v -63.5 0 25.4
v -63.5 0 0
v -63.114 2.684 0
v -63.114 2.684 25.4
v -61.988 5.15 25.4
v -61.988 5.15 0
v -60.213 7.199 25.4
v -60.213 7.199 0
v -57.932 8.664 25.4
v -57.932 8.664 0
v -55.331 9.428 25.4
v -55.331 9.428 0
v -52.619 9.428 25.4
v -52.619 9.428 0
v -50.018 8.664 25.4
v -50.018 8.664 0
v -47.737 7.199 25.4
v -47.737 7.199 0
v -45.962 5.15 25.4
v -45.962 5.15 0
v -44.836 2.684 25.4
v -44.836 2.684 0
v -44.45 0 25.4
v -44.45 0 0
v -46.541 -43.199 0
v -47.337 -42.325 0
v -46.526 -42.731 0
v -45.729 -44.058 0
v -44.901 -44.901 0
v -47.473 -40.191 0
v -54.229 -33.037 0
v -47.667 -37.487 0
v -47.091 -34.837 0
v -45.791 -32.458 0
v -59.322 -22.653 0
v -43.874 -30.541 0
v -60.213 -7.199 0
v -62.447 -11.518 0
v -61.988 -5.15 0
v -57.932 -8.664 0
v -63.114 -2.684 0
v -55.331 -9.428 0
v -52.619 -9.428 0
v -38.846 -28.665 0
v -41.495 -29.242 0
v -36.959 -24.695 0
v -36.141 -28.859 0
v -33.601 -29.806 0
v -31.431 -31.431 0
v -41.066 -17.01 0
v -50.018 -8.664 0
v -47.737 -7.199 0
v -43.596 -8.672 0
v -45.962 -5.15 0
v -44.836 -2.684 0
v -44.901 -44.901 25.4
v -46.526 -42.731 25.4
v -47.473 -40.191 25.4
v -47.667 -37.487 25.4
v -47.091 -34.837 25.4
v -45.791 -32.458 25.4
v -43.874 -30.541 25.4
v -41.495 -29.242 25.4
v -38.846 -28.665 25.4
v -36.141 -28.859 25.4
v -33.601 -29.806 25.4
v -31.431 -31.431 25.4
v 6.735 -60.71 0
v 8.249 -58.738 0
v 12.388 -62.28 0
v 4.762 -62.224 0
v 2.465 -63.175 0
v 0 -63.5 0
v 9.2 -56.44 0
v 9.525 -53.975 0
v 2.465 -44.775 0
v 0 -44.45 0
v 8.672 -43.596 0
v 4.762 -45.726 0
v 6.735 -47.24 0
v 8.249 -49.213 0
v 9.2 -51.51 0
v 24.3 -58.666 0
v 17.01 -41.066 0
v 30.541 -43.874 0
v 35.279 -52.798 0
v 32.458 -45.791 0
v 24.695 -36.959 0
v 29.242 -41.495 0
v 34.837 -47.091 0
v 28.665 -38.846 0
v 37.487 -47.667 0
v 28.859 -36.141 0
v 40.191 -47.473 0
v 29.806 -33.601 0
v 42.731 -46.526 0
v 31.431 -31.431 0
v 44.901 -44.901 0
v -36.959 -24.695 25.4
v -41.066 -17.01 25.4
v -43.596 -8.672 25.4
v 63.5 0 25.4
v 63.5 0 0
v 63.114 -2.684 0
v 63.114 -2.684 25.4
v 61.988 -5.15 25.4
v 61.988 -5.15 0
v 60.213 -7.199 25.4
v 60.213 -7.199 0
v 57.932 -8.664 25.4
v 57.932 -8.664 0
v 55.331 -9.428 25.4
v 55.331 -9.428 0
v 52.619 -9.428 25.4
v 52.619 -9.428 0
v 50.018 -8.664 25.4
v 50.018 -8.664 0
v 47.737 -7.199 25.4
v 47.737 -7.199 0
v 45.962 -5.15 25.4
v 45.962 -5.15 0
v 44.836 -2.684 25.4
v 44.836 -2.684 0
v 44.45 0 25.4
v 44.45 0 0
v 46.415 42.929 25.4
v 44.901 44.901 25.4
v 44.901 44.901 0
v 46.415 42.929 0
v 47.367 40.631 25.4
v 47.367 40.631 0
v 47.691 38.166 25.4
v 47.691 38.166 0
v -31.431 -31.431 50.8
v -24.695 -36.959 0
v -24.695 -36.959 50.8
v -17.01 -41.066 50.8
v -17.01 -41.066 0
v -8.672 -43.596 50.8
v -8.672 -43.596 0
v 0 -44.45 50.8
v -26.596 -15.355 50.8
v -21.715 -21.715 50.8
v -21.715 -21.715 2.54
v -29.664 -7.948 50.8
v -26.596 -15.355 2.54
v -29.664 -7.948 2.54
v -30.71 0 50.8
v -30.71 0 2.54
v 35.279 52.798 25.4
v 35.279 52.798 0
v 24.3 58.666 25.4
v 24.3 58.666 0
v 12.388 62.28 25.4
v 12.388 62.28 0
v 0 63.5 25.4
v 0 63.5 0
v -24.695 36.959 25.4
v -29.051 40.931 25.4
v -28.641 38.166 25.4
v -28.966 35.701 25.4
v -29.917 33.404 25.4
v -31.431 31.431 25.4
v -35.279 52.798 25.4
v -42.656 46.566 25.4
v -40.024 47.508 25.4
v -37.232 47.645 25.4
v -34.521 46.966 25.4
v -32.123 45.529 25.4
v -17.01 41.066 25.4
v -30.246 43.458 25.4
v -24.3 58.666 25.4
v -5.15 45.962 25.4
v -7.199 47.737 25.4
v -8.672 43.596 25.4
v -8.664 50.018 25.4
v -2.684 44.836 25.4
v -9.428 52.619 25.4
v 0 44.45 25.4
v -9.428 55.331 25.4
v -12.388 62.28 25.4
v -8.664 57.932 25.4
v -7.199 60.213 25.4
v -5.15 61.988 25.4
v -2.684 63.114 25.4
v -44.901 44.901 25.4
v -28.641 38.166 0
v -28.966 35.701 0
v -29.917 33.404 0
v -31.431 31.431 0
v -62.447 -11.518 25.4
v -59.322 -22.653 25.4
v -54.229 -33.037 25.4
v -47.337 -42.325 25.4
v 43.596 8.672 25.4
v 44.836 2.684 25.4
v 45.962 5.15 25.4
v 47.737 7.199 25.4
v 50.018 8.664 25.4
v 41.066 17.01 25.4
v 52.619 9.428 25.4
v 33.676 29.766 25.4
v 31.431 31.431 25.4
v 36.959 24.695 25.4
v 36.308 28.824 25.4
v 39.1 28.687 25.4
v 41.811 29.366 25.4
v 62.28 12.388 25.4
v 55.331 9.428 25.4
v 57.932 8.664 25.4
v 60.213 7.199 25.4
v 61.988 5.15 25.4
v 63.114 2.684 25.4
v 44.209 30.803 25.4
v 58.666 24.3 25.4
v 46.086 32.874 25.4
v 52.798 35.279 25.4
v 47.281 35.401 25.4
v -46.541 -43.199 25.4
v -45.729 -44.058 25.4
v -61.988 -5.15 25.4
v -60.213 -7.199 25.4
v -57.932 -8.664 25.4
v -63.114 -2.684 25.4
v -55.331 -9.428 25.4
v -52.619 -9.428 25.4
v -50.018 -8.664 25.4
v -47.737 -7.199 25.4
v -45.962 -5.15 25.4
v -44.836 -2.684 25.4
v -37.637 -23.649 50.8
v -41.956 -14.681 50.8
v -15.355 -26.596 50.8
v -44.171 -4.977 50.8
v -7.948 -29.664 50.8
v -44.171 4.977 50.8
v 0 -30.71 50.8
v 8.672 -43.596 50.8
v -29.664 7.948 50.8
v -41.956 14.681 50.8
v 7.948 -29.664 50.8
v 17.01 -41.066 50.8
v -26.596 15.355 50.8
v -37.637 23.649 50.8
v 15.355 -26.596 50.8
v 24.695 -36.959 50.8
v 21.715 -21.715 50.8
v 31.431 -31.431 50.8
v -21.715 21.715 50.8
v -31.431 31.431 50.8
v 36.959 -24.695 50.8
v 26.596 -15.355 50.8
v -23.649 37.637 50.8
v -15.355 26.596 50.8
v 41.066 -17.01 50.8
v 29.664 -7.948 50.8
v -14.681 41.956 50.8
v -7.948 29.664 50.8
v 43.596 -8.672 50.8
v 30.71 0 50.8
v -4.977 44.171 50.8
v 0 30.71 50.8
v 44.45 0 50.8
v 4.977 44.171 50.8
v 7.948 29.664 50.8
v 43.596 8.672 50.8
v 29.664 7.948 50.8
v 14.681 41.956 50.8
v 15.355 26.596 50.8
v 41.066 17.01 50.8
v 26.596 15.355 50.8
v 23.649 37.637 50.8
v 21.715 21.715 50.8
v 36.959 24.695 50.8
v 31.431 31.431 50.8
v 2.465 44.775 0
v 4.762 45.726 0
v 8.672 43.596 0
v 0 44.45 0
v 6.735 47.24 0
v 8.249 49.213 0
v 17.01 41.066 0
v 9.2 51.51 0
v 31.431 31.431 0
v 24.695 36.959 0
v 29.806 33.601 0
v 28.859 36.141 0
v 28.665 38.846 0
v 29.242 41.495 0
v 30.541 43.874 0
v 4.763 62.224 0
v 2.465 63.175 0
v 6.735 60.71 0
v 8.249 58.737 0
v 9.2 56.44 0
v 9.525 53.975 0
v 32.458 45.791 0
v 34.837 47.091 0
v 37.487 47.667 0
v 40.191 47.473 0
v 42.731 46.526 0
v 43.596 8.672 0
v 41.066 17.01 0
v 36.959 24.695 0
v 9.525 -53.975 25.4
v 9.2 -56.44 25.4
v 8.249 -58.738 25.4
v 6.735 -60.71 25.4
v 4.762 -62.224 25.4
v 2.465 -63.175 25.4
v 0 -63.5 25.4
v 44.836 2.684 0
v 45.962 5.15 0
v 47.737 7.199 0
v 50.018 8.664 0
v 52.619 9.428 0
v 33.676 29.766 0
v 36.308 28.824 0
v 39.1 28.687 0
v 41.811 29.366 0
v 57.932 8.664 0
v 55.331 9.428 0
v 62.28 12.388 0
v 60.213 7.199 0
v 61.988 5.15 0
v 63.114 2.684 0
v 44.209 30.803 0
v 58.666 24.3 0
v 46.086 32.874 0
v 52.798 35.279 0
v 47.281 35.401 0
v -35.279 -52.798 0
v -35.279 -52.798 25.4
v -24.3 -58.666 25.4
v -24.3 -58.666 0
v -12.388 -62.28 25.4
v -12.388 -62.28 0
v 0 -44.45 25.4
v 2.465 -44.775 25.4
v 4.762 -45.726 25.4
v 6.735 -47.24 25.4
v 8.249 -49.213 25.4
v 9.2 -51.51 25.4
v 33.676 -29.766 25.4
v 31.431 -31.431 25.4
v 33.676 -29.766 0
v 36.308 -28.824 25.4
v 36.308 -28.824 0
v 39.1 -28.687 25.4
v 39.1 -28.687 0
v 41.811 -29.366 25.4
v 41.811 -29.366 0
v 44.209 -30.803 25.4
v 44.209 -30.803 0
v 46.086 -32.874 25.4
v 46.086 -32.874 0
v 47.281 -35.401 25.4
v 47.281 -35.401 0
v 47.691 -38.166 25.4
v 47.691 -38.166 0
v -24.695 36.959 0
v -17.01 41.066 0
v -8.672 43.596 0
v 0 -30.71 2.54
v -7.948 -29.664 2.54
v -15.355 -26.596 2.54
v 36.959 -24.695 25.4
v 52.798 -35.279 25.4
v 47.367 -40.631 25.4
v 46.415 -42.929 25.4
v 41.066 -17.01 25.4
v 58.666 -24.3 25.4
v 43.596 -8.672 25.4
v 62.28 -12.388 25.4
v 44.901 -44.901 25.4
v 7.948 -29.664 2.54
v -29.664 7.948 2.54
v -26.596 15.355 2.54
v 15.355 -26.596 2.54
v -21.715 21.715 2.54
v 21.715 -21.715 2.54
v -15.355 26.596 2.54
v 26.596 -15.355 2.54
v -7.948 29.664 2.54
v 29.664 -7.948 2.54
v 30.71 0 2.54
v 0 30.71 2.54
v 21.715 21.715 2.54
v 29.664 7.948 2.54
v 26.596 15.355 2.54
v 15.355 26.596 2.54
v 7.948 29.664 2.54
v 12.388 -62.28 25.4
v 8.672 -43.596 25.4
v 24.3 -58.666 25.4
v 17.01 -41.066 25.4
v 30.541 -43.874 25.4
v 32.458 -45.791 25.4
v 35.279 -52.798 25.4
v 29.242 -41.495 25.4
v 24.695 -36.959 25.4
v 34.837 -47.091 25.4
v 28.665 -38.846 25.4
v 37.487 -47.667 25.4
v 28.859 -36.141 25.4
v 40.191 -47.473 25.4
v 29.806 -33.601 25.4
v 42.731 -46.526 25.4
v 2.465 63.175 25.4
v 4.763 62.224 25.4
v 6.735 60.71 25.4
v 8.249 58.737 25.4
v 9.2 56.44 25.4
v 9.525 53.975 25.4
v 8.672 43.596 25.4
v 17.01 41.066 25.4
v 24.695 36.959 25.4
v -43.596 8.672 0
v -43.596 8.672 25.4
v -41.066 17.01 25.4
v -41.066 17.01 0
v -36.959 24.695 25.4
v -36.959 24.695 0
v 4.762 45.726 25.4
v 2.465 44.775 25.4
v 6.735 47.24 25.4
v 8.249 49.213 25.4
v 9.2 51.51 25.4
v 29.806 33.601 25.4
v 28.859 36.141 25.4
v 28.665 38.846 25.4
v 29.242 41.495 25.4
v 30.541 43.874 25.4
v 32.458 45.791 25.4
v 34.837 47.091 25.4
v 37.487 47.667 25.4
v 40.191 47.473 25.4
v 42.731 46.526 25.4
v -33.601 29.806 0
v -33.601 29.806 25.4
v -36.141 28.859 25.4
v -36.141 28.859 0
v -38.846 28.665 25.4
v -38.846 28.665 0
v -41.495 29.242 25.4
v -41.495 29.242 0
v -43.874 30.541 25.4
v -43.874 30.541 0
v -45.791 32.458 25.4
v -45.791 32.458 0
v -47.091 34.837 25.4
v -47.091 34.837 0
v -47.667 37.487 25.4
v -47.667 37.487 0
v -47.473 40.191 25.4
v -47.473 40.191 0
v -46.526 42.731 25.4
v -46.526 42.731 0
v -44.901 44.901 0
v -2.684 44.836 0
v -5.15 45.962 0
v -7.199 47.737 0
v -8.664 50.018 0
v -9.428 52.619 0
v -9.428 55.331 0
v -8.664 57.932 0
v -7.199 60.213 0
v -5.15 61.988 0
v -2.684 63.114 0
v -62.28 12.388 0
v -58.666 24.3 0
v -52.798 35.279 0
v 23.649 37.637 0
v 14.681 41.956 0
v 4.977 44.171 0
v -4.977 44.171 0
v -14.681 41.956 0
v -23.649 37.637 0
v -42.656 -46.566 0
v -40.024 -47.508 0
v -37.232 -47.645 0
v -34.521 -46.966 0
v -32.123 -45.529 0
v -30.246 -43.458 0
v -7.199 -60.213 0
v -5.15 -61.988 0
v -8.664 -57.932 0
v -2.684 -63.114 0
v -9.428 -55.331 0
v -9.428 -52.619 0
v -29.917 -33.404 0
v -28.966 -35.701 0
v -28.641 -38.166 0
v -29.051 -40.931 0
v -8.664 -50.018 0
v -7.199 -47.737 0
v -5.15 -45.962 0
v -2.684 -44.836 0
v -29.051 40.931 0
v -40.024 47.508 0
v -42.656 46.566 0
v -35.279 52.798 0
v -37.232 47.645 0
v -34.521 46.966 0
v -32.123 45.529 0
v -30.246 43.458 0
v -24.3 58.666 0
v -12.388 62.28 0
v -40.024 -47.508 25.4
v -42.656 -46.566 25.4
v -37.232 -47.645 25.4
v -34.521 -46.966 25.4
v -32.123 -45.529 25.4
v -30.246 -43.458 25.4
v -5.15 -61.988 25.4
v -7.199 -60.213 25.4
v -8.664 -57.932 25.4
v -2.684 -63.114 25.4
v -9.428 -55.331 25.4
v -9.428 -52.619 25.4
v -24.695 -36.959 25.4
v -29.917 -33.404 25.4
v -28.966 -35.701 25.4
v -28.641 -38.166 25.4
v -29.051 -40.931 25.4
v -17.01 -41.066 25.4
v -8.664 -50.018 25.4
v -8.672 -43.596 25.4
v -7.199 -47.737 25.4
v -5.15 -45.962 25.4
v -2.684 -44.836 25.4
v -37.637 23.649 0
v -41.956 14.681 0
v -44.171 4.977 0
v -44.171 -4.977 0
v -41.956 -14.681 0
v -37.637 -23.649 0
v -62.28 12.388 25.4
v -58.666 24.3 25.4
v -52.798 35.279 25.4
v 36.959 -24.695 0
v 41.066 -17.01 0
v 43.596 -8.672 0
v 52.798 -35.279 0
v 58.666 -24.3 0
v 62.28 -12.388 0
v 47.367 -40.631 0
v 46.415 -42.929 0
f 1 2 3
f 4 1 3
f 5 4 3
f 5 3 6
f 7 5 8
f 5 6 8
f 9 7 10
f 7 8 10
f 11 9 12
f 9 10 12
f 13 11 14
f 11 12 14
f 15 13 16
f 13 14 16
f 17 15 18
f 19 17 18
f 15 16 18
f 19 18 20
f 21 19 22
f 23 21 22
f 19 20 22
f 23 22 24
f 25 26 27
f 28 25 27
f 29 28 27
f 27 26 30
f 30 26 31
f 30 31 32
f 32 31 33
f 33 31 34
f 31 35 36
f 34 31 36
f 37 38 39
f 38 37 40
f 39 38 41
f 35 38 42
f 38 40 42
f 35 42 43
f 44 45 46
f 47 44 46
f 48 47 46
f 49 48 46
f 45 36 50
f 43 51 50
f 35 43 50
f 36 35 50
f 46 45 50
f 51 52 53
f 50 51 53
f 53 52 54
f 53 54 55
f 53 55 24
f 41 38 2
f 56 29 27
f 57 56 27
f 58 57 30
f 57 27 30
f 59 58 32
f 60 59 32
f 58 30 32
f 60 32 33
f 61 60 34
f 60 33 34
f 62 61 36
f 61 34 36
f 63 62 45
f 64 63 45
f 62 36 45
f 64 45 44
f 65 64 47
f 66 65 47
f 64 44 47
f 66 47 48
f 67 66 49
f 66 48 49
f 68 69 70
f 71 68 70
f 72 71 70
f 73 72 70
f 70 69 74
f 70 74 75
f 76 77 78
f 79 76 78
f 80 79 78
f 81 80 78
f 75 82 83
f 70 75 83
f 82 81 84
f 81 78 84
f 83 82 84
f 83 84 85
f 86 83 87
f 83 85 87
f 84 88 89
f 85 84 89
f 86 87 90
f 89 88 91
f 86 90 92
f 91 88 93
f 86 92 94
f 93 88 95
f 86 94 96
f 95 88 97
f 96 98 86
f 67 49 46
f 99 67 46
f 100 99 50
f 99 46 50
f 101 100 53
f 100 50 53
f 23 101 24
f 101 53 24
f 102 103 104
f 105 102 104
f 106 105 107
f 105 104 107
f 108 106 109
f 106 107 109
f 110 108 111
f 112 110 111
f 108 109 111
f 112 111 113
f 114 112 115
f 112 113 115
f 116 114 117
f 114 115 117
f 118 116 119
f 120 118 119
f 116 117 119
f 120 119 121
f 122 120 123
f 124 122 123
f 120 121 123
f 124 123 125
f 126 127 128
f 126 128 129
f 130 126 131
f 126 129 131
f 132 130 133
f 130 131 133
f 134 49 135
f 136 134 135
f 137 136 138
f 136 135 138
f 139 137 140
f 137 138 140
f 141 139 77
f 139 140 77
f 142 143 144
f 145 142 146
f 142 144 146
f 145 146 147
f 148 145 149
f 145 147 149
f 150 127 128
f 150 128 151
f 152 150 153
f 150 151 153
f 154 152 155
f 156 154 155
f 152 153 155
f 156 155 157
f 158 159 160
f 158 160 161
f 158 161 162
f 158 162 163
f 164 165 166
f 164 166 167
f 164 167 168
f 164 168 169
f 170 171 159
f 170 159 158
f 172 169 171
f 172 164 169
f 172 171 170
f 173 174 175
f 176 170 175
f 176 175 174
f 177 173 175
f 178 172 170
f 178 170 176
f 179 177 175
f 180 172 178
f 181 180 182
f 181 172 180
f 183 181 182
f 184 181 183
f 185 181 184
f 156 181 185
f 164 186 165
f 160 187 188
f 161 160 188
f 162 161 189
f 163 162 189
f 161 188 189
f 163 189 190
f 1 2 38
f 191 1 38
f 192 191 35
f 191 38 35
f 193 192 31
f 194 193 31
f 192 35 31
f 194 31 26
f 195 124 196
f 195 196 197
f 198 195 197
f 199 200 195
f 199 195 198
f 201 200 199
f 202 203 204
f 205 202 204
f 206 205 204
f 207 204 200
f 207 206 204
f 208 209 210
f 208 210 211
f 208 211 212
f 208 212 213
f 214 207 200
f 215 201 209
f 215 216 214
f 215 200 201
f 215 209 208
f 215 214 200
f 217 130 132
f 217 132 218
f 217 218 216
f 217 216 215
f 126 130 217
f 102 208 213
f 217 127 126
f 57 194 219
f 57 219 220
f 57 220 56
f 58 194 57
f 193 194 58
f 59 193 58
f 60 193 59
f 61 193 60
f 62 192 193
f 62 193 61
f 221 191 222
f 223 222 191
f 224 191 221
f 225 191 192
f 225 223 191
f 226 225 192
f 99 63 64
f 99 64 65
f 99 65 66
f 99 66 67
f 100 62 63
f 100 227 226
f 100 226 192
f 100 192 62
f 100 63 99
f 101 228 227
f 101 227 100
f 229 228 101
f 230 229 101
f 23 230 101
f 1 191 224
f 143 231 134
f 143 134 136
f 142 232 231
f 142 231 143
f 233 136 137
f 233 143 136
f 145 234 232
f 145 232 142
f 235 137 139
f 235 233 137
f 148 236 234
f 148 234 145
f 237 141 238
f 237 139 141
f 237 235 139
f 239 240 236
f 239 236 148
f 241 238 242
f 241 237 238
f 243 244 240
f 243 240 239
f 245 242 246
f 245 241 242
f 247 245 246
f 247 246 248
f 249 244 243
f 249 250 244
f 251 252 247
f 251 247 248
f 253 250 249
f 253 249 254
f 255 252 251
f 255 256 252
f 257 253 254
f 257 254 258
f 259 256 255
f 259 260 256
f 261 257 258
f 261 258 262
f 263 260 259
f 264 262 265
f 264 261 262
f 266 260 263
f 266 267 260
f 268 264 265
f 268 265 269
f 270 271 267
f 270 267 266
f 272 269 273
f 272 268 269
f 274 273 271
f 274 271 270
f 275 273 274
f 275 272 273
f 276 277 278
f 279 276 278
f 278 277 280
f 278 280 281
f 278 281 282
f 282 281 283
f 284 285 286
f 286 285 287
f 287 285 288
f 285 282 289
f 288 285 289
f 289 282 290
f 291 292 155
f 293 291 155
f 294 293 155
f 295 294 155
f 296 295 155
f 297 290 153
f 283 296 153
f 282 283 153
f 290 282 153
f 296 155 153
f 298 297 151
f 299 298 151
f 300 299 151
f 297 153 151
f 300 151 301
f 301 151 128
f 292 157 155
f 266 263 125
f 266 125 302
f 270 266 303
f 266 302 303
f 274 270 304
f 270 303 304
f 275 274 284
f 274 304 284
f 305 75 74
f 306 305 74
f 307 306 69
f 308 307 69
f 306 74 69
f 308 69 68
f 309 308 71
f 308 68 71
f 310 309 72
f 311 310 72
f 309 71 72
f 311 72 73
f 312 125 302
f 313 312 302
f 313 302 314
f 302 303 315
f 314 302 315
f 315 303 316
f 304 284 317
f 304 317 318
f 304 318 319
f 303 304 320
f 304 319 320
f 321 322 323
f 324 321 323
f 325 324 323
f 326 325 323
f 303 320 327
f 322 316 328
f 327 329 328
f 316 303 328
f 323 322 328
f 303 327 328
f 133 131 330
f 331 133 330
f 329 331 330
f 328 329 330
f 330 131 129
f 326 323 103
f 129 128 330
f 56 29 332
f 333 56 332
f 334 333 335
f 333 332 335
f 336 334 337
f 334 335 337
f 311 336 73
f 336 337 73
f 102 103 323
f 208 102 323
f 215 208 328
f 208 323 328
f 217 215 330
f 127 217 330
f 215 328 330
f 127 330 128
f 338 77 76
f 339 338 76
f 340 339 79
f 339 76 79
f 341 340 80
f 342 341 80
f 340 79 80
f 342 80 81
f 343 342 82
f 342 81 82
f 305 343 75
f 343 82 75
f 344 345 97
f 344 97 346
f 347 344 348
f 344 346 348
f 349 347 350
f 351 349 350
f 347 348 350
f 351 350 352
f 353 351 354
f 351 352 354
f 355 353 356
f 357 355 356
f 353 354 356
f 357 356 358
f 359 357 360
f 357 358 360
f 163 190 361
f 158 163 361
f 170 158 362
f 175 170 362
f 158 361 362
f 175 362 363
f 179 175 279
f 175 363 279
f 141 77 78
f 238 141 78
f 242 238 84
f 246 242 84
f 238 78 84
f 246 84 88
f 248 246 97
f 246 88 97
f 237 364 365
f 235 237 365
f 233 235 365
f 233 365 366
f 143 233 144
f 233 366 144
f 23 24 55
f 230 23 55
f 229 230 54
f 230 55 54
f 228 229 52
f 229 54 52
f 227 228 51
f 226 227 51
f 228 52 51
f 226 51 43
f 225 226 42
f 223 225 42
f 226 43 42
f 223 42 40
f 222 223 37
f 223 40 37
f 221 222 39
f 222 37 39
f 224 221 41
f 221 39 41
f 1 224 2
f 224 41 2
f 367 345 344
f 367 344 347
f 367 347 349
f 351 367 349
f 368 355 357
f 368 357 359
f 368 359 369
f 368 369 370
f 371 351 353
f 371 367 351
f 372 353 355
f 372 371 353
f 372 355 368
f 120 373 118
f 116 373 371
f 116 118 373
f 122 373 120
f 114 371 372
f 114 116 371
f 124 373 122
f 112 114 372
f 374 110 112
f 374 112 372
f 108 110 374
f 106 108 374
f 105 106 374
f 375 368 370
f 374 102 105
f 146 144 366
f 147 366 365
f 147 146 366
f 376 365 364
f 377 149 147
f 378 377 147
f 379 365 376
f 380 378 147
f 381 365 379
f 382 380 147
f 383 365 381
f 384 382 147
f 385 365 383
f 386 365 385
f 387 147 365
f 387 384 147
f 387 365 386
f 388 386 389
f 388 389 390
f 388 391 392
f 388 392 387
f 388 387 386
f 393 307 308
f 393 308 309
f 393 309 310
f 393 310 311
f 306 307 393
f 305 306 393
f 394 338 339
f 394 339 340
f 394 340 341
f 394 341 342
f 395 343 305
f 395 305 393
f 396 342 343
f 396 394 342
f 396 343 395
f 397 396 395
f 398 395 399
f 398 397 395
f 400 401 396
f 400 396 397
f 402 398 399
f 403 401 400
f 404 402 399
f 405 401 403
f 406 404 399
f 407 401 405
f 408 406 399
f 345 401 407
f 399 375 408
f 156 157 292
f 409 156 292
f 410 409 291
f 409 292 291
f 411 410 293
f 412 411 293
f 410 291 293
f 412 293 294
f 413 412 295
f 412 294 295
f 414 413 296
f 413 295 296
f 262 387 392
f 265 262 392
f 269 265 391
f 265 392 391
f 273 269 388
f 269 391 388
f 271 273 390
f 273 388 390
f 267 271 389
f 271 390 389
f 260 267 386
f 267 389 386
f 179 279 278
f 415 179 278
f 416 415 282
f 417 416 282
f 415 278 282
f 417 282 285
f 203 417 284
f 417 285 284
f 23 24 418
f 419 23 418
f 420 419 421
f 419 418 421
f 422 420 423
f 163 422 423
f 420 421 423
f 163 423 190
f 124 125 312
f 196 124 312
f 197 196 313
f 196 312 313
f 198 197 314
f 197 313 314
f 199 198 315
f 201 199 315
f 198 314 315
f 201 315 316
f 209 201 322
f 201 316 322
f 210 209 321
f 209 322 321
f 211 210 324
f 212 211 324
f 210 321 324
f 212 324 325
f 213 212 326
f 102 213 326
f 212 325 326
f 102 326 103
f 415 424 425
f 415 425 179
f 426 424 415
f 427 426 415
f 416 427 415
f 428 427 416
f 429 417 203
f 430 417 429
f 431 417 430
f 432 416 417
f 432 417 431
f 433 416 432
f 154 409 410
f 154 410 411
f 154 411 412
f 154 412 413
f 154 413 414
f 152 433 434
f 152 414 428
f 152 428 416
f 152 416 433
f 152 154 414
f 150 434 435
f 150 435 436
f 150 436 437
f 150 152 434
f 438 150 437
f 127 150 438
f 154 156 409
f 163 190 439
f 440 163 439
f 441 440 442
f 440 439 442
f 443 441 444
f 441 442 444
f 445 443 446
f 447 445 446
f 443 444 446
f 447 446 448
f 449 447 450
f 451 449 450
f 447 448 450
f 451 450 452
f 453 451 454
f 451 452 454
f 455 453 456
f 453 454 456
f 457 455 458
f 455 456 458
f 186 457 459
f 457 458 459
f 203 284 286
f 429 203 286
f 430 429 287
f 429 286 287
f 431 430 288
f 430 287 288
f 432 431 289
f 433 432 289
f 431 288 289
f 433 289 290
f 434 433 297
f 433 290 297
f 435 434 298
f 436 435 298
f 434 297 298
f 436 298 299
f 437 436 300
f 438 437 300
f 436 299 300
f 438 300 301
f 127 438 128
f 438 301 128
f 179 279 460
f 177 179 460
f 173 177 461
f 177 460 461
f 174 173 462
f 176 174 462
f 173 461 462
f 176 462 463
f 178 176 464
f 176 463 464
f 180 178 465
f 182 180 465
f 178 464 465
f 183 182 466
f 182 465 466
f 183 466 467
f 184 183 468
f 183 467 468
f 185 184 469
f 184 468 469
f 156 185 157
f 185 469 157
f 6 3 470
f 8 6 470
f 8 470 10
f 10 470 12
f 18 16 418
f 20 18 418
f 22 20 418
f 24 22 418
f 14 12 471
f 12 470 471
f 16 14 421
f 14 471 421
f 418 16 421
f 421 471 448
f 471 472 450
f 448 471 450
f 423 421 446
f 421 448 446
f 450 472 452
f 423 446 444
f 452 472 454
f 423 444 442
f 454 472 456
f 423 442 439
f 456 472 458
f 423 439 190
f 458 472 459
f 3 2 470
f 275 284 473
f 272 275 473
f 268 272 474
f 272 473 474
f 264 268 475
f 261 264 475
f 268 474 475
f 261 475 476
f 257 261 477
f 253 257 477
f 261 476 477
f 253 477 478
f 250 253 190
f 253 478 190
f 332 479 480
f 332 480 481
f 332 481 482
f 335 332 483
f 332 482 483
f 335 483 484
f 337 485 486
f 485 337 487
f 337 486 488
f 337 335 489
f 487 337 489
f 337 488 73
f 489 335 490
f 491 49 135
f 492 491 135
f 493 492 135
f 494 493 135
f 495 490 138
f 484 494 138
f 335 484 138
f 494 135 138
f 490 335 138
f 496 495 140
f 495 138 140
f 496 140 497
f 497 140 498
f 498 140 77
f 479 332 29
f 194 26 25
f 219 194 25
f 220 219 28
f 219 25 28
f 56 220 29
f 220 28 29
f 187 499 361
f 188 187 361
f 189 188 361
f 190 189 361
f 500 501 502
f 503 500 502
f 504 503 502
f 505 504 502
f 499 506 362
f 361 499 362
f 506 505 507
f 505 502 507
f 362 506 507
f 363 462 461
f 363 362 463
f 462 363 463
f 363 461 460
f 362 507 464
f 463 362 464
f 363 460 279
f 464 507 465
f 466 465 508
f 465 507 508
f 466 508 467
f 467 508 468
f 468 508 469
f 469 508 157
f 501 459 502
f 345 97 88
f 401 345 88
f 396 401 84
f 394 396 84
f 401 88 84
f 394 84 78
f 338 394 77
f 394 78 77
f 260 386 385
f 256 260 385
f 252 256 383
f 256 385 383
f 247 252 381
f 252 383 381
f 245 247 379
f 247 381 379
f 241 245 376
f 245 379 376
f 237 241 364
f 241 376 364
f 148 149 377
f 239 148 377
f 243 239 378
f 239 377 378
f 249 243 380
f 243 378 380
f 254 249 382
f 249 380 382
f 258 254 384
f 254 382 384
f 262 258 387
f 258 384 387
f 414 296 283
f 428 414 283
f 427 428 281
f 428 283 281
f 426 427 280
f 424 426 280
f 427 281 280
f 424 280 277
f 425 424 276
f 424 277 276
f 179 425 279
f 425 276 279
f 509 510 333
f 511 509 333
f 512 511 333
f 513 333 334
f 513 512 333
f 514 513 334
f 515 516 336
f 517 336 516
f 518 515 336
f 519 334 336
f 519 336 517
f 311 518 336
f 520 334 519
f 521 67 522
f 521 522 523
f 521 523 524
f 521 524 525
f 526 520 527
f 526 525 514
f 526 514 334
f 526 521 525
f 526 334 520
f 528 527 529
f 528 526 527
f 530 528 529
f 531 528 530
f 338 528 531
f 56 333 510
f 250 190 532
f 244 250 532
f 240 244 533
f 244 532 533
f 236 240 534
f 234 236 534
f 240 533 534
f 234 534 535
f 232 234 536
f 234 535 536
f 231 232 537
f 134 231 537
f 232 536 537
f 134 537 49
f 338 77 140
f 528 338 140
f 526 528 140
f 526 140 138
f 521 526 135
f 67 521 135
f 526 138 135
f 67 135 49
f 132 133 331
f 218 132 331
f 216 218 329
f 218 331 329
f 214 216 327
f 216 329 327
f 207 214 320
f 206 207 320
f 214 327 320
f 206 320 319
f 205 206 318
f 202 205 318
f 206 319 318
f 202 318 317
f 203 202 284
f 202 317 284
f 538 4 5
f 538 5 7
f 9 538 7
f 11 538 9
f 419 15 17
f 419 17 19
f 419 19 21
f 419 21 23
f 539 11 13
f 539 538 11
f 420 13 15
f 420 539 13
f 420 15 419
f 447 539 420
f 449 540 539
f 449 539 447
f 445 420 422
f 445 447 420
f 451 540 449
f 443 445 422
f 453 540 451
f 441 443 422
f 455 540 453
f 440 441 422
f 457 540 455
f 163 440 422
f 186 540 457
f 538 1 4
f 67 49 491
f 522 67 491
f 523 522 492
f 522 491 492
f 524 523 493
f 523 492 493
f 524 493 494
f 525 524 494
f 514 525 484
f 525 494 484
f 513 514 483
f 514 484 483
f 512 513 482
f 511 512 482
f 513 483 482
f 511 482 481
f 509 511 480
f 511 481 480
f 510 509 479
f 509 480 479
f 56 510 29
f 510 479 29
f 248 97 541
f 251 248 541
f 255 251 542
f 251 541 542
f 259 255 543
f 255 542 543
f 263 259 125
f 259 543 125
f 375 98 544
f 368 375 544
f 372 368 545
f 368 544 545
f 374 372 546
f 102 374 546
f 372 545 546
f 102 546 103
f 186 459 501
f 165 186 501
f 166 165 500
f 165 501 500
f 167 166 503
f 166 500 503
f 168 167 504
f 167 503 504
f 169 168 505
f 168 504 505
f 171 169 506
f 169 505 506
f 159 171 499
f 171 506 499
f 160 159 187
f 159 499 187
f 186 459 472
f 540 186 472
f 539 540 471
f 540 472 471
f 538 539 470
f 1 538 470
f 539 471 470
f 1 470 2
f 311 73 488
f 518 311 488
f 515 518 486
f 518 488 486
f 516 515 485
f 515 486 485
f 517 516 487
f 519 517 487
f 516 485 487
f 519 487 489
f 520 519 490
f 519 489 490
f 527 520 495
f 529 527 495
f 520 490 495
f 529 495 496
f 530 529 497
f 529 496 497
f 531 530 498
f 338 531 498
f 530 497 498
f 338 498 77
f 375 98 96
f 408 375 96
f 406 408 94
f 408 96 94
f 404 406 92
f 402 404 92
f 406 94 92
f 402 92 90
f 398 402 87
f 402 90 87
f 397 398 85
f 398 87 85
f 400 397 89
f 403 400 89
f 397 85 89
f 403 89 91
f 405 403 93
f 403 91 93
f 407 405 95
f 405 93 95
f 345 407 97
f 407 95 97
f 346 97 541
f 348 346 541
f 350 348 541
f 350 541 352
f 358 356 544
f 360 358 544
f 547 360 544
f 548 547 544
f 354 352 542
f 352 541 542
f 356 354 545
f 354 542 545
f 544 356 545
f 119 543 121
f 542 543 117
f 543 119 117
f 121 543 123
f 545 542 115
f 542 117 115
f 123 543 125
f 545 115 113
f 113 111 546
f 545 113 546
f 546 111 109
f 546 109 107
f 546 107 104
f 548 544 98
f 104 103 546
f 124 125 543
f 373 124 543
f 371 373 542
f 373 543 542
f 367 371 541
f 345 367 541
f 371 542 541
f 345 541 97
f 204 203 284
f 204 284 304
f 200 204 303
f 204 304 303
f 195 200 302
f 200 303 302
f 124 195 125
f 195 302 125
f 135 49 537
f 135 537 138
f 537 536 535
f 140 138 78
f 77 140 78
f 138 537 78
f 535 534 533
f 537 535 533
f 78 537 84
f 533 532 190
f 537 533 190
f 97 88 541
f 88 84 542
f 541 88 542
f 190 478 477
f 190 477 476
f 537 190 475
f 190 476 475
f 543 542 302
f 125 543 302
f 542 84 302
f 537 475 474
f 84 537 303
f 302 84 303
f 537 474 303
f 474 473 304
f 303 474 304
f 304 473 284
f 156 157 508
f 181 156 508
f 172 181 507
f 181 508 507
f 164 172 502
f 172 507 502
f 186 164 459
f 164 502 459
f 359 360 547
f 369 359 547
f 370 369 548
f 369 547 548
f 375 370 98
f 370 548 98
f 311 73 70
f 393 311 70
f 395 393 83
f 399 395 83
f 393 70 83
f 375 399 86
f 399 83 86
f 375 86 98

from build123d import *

# Parameters (mm, degrees)
F1_DEPTH = 25.4
F2_DEPTH = 50.8
F3_DEPTH = 2.54


with BuildPart() as f1:
    # F0 (on Top) → F1 (new body)
    with BuildSketch(Plane.XY):
        with BuildLine():
            ThreePointArc((63.5, 0), (53.975, -9.525), (44.45, 0))
            ThreePointArc((44.45, 0), (41.0664451818, -17.0102786611), (31.4308962821, -31.4308965654))
            ThreePointArc((31.4308962821, -31.4308965654), (41.8111481153, -29.3661359291), (47.6910885145, -38.1660885145))
            ThreePointArc((47.6910885145, -38.1660885145), (46.9660410736, -41.8111481791), (44.9012806494, -44.9012805613))
            ThreePointArc((44.9012806494, -44.9012805613), (58.6663503264, -24.3003979264), (63.5, 0))
        make_face()
    extrude(amount=F1_DEPTH)


with BuildPart() as f1b:
    # F0 (on Top) → F1, piece 2 (new body)
    with BuildSketch(Plane.XY):
        with BuildLine():
            ThreePointArc((44.9012806494, -44.9012805613), (31.4308965166, -44.9012806982), (31.4308962821, -31.4308965654))
            ThreePointArc((31.4308962821, -31.4308965654), (17.0102784761, -41.0664452584), (0, -44.45))
            ThreePointArc((0, -44.45), (6.7351920908, -47.2398079092), (9.525, -53.975))
            ThreePointArc((9.525, -53.975), (6.7351920871, -60.7101920945), (-1.06e-08, -63.5))
            ThreePointArc((-1.06e-08, -63.5), (24.3003979791, -58.6663503046), (44.9012806494, -44.9012805613))
        make_face()
    extrude(amount=F1_DEPTH)


with BuildPart() as f1c:
    # F0 (on Top) → F1, piece 3 (new body)
    with BuildSketch(Plane.XY):
        with BuildLine():
            ThreePointArc((-1.06e-08, -63.5), (-9.525, -53.9749999947), (0, -44.45))
            ThreePointArc((0, -44.45), (-17.0102785686, -41.0664452201), (-31.4308964237, -31.4308964237))
            ThreePointArc((-31.4308964237, -31.4308964237), (-29.3661359674, -34.5210288213), (-28.6410885145, -38.1660885145))
            ThreePointArc((-28.6410885145, -38.1660885145), (-34.5210288767, -46.9660410847), (-44.9012806902, -44.9012805205))
            ThreePointArc((-44.9012806902, -44.9012805205), (-24.3003980155, -58.6663502895), (-1.06e-08, -63.5))
        make_face()
    extrude(amount=F1_DEPTH)


with BuildPart() as f1d:
    # F0 (on Top) → F1, piece 4 (new body)
    with BuildSketch(Plane.XY):
        with BuildLine():
            ThreePointArc((-44.9012806902, -44.9012805205), (-44.9012805629, -31.4308963813), (-31.4308964237, -31.4308964237))
            ThreePointArc((-31.4308964237, -31.4308964237), (-41.0664452201, -17.0102785686), (-44.45, 0))
            ThreePointArc((-44.45, 0), (-53.9749999922, -9.525), (-63.5, -1.56e-08))
            ThreePointArc((-63.5, -1.56e-08), (-59.3218826508, -22.653128675), (-47.337346821, -42.3252359232))
            ThreePointArc((-47.337346821, -42.3252359232), (-46.1372962225, -43.6302635481), (-44.9012806902, -44.9012805205))
        make_face()
    extrude(amount=F1_DEPTH)


with BuildPart() as f1e:
    # F0 (on Top) → F1, piece 5 (new body)
    with BuildSketch(Plane.XY):
        with BuildLine():
            ThreePointArc((-44.45, 0), (-41.0664452333, 17.0102785369), (-31.4308964724, 31.4308963751))
            ThreePointArc((-31.4308964724, 31.4308963751), (-44.9012806825, 31.4308965009), (-44.9012804996, 44.9012807111))
            ThreePointArc((-44.9012804996, 44.9012807111), (-58.6663502888, 24.3003980171), (-63.5, -1.56e-08))
            ThreePointArc((-63.5, -1.56e-08), (-53.9750000078, 9.525), (-44.45, 0))
        make_face()
    extrude(amount=F1_DEPTH)


with BuildPart() as f1f:
    # F0 (on Top) → F1, piece 6 (new body)
    with BuildSketch(Plane.XY):
        with BuildLine():
            ThreePointArc((31.4308964405, 31.430896407), (41.0664452246, 17.0102785577), (44.45, 0))
            ThreePointArc((44.45, 0), (53.975, 9.525), (63.5, 0))
            ThreePointArc((63.5, 0), (58.6663503145, 24.3003979552), (44.9012806053, 44.9012806053))
            ThreePointArc((44.9012806053, 44.9012806053), (46.9660410617, 41.8111482078), (47.6910885145, 38.1660885145))
            ThreePointArc((47.6910885145, 38.1660885145), (41.8111482187, 29.3661359719), (31.4308964405, 31.430896407))
        make_face()
    extrude(amount=F1_DEPTH)


with BuildPart() as f1g:
    # F0 (on Top) → F1, piece 7 (new body)
    with BuildSketch(Plane.XY):
        with BuildLine():
            ThreePointArc((0, 44.45), (17.0102785795, 41.0664452156), (31.4308964405, 31.430896407))
            ThreePointArc((31.4308964405, 31.430896407), (31.4308964154, 44.901280597), (44.9012806053, 44.9012806053))
            ThreePointArc((44.9012806053, 44.9012806053), (24.3003980186, 58.6663502882), (1.372e-07, 63.5))
            ThreePointArc((1.372e-07, 63.5), (6.7351921393, 60.7101920423), (9.525, 53.975))
            ThreePointArc((9.525, 53.975), (6.7351920908, 47.2398079092), (0, 44.45))
        make_face()
    extrude(amount=F1_DEPTH)


with BuildPart() as f1h:
    # F0 (on Top) → F1, piece 8 (new body)
    with BuildSketch(Plane.XY):
        with BuildLine():
            ThreePointArc((-31.4308964724, 31.4308963751), (-17.0102786004, 41.066445207), (0, 44.45))
            ThreePointArc((0, 44.45), (-9.525, 53.9750000686), (1.372e-07, 63.5))
            ThreePointArc((1.372e-07, 63.5), (-24.3003978227, 58.6663503693), (-44.9012804996, 44.9012807111))
            ThreePointArc((-44.9012804996, 44.9012807111), (-34.5210287522, 46.9660410331), (-28.6410885145, 38.1660885145))
            ThreePointArc((-28.6410885145, 38.1660885145), (-29.3661359805, 34.5210287895), (-31.4308964724, 31.4308963751))
        make_face()
    extrude(amount=F1_DEPTH)


with BuildPart() as f2:
    # F0 (on Top) → F2 (new body)
    with BuildSketch(Plane.XY):
        with BuildLine():
            ThreePointArc((-44.45, 0), (-41.0664452201, -17.0102785686), (-31.4308964237, -31.4308964237))
            Line((-31.4308964237, -31.4308964237), (-21.7152558542, -21.7152558542))
            ThreePointArc((-21.7152558542, -21.7152558542), (-28.3723490719, -11.7522117819), (-30.7100093394, 0))
            Line((-30.7100093394, 0), (-44.45, 0))
        make_face()
        with BuildLine():
            Line((0, 30.7100093394), (0, 44.45))
            ThreePointArc((0, 44.45), (-17.0102786004, 41.066445207), (-31.4308964724, 31.4308963751))
            ThreePointArc((-31.4308964724, 31.4308963751), (-41.0664452333, 17.0102785369), (-44.45, 0))
            Line((-44.45, 0), (-30.7100093394, 0))
            ThreePointArc((-30.7100093394, 0), (-21.7152558542, 21.7152558542), (0, 30.7100093394))
        make_face()
        with BuildLine():
            Line((30.7100093394, 0), (44.45, 0))
            ThreePointArc((44.45, 0), (41.0664452246, 17.0102785577), (31.4308964405, 31.430896407))
            ThreePointArc((31.4308964405, 31.430896407), (17.0102785795, 41.0664452156), (0, 44.45))
            Line((0, 44.45), (0, 30.7100093394))
            ThreePointArc((0, 30.7100093394), (21.7152558542, 21.7152558542), (30.7100093394, 0))
        make_face()
        with BuildLine():
            ThreePointArc((31.4308962821, -31.4308965654), (41.0664451818, -17.0102786611), (44.45, 0))
            Line((44.45, 0), (30.7100093394, 0))
            ThreePointArc((30.7100093394, 0), (21.7152558542, -21.7152558542), (0, -30.7100093394))
            Line((0, -30.7100093394), (0, -44.45))
            ThreePointArc((0, -44.45), (17.0102784761, -41.0664452584), (31.4308962821, -31.4308965654))
        make_face()
        with BuildLine():
            ThreePointArc((-31.4308964237, -31.4308964237), (-17.0102785686, -41.0664452201), (0, -44.45))
            Line((0, -44.45), (0, -30.7100093394))
            ThreePointArc((0, -30.7100093394), (-11.7522117819, -28.3723490719), (-21.7152558542, -21.7152558542))
            Line((-21.7152558542, -21.7152558542), (-31.4308964237, -31.4308964237))
        make_face()
    extrude(amount=F2_DEPTH)

    # F0 (on Top) → F3 (join)
    with BuildSketch(Plane.XY):
        with BuildLine():
            Line((0, 0), (30.7100093394, 0))
            ThreePointArc((30.7100093394, 0), (21.7152558542, 21.7152558542), (0, 30.7100093394))
            Line((0, 30.7100093394), (0, 0))
        make_face()
        with BuildLine():
            ThreePointArc((0, -30.7100093394), (21.7152558542, -21.7152558542), (30.7100093394, 0))
            Line((30.7100093394, 0), (0, 0))
            Line((0, 0), (0, -30.7100093394))
        make_face()
        with BuildLine():
            ThreePointArc((-21.7152558542, -21.7152558542), (-11.7522117819, -28.3723490719), (0, -30.7100093394))
            Line((0, -30.7100093394), (0, 0))
            Line((0, 0), (-21.7152558542, -21.7152558542))
        make_face()
        with BuildLine():
            Line((-21.7152558542, -21.7152558542), (0, 0))
            Line((0, 0), (-30.7100093394, 0))
            ThreePointArc((-30.7100093394, 0), (-28.3723490719, -11.7522117819), (-21.7152558542, -21.7152558542))
        make_face()
        with BuildLine():
            Line((0, 0), (0, 30.7100093394))
            ThreePointArc((0, 30.7100093394), (-21.7152558542, 21.7152558542), (-30.7100093394, 0))
            Line((-30.7100093394, 0), (0, 0))
        make_face()
    extrude(amount=F3_DEPTH)


solid = Compound([f1.part, f1b.part, f1c.part, f1d.part, f1e.part, f1f.part, f1g.part, f1h.part, f2.part])
